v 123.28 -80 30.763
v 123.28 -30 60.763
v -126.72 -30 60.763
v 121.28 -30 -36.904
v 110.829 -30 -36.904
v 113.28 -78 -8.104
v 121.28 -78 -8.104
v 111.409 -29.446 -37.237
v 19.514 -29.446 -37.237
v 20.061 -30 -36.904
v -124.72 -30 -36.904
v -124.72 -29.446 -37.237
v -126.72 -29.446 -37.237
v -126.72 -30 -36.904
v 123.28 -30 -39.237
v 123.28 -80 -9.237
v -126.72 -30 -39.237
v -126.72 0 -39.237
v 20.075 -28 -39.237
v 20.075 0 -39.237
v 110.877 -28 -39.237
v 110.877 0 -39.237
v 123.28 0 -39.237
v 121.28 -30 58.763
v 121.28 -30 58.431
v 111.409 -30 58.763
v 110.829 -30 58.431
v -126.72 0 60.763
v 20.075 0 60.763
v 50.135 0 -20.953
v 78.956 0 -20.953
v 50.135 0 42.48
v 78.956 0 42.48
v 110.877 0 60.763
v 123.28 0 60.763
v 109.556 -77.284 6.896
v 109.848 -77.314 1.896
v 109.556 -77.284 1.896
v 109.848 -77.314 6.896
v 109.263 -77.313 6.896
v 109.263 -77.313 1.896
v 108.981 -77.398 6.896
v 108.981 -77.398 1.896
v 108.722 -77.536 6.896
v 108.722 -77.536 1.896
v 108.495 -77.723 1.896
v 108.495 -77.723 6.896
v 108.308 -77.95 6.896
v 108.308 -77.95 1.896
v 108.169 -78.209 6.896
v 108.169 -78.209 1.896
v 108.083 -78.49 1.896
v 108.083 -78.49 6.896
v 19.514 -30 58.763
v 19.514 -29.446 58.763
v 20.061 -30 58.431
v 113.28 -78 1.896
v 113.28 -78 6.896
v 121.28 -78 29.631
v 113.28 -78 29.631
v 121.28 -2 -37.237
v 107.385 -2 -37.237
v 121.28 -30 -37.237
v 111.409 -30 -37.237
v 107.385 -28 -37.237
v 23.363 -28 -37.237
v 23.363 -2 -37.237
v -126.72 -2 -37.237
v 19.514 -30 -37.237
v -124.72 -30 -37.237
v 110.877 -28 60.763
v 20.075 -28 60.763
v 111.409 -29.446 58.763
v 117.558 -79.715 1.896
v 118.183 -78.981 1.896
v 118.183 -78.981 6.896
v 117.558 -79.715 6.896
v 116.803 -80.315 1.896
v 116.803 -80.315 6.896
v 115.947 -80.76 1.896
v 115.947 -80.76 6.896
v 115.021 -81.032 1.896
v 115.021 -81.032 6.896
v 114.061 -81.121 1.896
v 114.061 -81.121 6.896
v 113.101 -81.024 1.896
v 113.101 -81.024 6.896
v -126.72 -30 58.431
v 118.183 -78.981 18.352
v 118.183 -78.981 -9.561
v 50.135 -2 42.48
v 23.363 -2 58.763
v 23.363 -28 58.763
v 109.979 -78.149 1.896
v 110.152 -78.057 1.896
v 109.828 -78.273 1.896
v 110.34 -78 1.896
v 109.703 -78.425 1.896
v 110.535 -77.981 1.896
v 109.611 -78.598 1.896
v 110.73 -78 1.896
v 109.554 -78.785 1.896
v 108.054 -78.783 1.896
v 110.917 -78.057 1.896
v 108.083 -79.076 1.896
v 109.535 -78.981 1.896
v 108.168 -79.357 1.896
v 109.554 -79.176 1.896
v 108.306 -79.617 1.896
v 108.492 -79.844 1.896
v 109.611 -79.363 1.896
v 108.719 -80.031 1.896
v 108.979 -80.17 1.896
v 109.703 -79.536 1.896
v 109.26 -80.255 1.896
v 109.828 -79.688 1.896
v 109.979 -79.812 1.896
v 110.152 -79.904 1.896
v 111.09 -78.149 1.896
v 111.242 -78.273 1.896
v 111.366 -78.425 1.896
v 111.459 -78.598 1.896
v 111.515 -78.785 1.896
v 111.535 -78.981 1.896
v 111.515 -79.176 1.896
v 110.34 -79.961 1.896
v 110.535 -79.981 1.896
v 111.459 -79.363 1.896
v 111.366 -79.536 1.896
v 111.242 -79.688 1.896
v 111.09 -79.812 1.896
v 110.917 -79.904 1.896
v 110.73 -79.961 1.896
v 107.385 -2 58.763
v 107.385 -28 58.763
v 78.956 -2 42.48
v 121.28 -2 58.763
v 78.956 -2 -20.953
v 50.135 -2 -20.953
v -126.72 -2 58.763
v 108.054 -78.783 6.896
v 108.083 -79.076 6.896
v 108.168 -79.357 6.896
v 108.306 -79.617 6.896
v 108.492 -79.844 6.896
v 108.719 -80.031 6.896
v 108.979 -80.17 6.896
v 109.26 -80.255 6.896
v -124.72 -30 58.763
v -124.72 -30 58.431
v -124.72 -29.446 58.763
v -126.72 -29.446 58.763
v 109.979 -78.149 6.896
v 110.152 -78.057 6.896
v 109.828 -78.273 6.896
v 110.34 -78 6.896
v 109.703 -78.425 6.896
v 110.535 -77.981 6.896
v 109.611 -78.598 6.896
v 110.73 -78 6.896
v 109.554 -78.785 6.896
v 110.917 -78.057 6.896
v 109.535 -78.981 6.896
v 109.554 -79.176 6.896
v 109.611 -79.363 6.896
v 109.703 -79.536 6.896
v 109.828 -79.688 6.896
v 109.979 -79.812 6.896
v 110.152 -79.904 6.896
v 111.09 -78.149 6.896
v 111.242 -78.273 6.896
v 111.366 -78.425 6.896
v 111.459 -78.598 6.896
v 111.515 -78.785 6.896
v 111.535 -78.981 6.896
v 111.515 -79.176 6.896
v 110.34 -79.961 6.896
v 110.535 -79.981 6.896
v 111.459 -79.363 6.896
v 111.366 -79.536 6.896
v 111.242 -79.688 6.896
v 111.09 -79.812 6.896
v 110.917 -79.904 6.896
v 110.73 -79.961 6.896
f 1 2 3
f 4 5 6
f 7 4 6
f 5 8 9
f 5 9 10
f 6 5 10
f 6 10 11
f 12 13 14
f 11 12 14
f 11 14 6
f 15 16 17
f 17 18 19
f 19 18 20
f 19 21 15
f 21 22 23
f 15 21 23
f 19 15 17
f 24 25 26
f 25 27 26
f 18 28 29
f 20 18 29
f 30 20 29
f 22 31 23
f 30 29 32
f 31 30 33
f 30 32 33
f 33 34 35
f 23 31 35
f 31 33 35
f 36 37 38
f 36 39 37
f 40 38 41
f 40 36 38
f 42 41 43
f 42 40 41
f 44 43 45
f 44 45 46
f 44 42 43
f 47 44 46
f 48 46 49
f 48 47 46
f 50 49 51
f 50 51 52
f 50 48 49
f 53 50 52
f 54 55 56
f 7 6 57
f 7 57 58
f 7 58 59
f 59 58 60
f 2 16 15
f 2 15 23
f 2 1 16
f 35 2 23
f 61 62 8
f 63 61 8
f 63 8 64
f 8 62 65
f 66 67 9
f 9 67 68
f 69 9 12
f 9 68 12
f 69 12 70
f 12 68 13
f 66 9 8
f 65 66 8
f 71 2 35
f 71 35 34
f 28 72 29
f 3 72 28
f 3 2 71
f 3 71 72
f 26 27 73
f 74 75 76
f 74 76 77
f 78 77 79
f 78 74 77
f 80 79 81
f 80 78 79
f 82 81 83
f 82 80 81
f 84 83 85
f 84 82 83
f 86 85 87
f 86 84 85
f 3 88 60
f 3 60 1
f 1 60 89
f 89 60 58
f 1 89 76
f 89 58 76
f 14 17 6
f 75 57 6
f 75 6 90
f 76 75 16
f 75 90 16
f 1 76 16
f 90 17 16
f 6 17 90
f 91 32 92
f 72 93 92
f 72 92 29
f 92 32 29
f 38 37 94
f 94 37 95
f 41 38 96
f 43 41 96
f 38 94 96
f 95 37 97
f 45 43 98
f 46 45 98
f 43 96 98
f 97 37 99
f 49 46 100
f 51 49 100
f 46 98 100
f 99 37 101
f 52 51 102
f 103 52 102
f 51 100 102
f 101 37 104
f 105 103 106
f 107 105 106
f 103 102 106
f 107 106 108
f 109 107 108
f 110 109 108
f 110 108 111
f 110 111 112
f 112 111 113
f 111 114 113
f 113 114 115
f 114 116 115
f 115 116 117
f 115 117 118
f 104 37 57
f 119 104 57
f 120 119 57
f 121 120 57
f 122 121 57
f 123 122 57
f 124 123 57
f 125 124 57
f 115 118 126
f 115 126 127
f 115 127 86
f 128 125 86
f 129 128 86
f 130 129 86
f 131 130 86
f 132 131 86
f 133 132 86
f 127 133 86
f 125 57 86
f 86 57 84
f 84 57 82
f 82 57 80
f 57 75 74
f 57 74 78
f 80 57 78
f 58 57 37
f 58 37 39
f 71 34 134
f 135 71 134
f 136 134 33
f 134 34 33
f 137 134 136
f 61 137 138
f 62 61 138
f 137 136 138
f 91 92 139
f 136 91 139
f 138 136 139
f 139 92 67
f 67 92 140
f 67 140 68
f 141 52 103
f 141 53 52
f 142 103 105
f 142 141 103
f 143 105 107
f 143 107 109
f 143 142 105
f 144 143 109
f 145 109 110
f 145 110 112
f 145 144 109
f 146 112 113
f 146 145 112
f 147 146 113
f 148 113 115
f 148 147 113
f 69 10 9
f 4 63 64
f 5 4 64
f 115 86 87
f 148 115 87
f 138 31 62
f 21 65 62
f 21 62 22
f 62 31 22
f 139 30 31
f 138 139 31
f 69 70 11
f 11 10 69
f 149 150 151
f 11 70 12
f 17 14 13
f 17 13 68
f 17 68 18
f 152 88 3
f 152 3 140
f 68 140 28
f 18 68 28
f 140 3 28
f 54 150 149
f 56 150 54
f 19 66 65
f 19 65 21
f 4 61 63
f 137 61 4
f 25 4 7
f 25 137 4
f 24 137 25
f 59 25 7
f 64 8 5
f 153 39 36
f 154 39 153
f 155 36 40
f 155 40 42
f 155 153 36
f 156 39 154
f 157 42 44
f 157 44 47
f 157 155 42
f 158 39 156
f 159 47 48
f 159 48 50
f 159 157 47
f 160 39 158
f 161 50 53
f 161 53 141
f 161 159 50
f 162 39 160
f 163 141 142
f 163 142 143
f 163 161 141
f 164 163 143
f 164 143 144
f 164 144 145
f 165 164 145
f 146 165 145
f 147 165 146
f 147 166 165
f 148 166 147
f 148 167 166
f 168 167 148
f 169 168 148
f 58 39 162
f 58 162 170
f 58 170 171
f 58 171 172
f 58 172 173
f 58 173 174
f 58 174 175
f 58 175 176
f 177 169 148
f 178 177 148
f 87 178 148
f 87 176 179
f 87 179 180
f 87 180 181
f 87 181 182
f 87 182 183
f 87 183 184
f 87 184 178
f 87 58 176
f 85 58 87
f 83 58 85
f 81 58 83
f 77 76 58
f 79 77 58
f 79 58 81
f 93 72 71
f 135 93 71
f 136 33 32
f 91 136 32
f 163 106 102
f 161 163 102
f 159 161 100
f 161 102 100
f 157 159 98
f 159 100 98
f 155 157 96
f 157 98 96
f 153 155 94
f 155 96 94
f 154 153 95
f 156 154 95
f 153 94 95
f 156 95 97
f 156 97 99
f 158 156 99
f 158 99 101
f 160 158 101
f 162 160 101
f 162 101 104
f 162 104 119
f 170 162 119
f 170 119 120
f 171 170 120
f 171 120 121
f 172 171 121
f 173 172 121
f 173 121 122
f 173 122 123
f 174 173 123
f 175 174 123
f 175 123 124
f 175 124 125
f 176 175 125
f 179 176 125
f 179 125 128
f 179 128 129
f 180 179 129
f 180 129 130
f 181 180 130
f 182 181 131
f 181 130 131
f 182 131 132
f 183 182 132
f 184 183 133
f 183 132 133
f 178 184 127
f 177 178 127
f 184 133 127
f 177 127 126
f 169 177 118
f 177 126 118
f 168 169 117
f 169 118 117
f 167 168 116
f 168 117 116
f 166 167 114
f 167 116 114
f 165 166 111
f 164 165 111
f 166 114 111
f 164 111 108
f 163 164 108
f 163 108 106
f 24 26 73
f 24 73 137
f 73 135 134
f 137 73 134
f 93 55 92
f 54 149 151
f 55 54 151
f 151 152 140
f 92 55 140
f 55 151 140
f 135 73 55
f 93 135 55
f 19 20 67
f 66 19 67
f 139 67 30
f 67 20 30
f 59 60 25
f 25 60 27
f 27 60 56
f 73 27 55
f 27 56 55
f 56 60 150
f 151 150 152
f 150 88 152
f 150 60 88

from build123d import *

# Parameters (mm, degrees)
F1_DEPTH     = 5
F3_DEPTH     = 25
F5_DEPTH     = 2
F7_DEPTH     = 250
F9_DEPTH     = 248
F11_DEPTH    = 110
F13_W        = 5
F13_H        = 5
F14_DEPTH    = 3
F15_T1_DEPTH = 27.9128784748
F16_DEPTH    = 5
F18_D        = 2
F19_R        = 1.49999


# Not quite as in the source:
# - a fillet or chamfer that OpenCascade refuses, or shapes differently, is made with other operations: its cross-section is extruded or revolved along the edge and cut away or added
# - a fillet or chamfer is up to 0.001 mm smaller than in the source, because OpenCascade refuses the exact size


with BuildPart() as f1:
    # F0 (on Front) → F1 (new body)
    with BuildSketch(Plane.XZ):
        Polygon((20.074704662, 60.7631485909), (-126.7197424916, 60.7631485909), (-126.7197424916, 10.7631485909), (-126.7197424916, -39.2368514091), (20.074704662, -39.2368514091), (50.1353926957, -20.9532961249), (78.9564624429, -20.9532961249), (110.8765751123, -39.2368514091), (123.2802575084, -39.2368514091), (123.2802575084, 10.7631485909), (123.2802575084, 60.7631485909), (110.8765751123, 60.7631485909), (78.9564624429, 42.4795933068), (50.1353926957, 42.4795933068), align=None)
    extrude(amount=F1_DEPTH)

    # F2 (on face) → F3 (join)
    with BuildSketch(Plane.XZ.offset(5)):
        Polygon((-126.7197424916, -39.2368514091), (20.074704662, -39.2368514091), (50.1353926957, -20.9532961249), (78.9564624429, -20.9532961249), (110.8765751123, -39.2368514091), (123.2802575084, -39.2368514091), (123.2802575084, 60.7631485909), (110.8765751123, 60.7631485909), (78.9564624429, 42.4795933068), (50.1353926957, 42.4795933068), (20.074704662, 60.7631485909), (-126.7197424916, 60.7631485909), align=None)
        Polygon((49.574933962, -18.9532961249), (19.5142459283, -37.2368514091), (-124.7197424916, -37.2368514091), (-124.7197424916, 58.7631485909), (19.5142459283, 58.7631485909), (49.574933962, 40.4795933068), (79.4886903674, 40.4795933068), (111.4088030368, 58.7631485909), (121.2802575084, 58.7631485909), (121.2802575084, -37.2368514091), (111.4088030368, -37.2368514091), (79.4886903674, -18.9532961249), align=None, mode=Mode.SUBTRACT)
    extrude(amount=F3_DEPTH)

    # F4 (on face) → F5 (join)
    with BuildSketch(Plane.XZ.offset(30)):
        Polygon((110.8765751123, 60.7631485909), (20.074704662, 60.7631485909), (50.1353926957, 42.4795933068), (78.9564624429, 42.4795933068), align=None)
        Polygon((50.1353926957, -20.9532961249), (20.074704662, -39.2368514091), (110.8765751123, -39.2368514091), (78.9564624429, -20.9532961249), align=None)
    extrude(amount=-F5_DEPTH)

    # F6 (on face) → F7 (join)
    with BuildSketch(Plane.YZ.offset(123.2802575084)):
        Polygon((-80, -9.2368514091), (-30, -39.2368514091), (-30, 60.7631485909), (-80, 30.7631485909), align=None)
    extrude(amount=-F7_DEPTH)

    # F8 (on face) → F9 (cut)
    with BuildSketch(Plane(origin=(-126.7197424916, 0, 0), x_dir=(0, -1, 0), z_dir=(-1, 0, 0))):
        Polygon((78, 29.630767833), (29.4460320701, 58.7631485909), (2, 58.7631485909), (2, -37.2368514091), (29.4460320701, -37.2368514091), (78, -8.1044706511), align=None)
    extrude(amount=-F9_DEPTH, mode=Mode.SUBTRACT)

    # F10 (on face) → F11 (cut)
    with BuildSketch(Plane(origin=(0, 0, -39.2368514091), x_dir=(1, 0, 0), z_dir=(0, 0, -1))):
        Polygon((-126.7197424916, 80), (-126.7197424916, 30), (123.2802575084, 80), align=None)
    extrude(amount=-F11_DEPTH, mode=Mode.SUBTRACT)

    # F13 (on face) → F14 (join)
    with BuildSketch(Plane(origin=(-10.6430670189, -53.2153350945, 0), x_dir=(0.9805806757, -0.1961161351, 0), z_dir=(-0.1961161351, -0.9805806757, 0))):
        with Locations((128.8774899908, 4.3955293489)):
            Rectangle(F13_W, F13_H)
    extrude(amount=F14_DEPTH)

    # F15: fillet of radius 5 on 1 edges, made by hand

    # F15_s2 → F15_t1 (cut)
    with BuildSketch(Plane.XY.offset(-9.5609098885)):
        with BuildLine():
            ThreePointArc((118.1831608869, -78.9805806757), (115.9468261093, -80.7598517163), (113.1012273101, -81.0236056685))
            Line((113.1012273101, -81.0236056685), (117.5948124814, -81.9223227028))
            Line((117.5948124814, -81.9223227028), (118.1831608869, -78.9805806757))
        make_face()
    extrude(amount=F15_T1_DEPTH, mode=Mode.SUBTRACT)

    # F16 (add): a face of the model
    f16_faces = [f1.faces().sort_by_distance(p)[0] for p in [
        (112.9860833057, -79.4708710135, 4.3955293489),
    ]]
    extrude(f16_faces, amount=F16_DEPTH)

    # F18 (through all)
    with Locations(Plane.XY.offset(6.8955293489)):
        with Locations((110.5346316165, -78.9805806757)):
            Hole(F18_D / 2)

    # F19 (radius 1.5 in the source; OpenCascade refuses exactly that, so slightly less here)
    f19_edges = [f1.edges().sort_by_distance(p)[0] for p in [
        (108.377354, -77.019419, 4.395529),
        (107.789006, -79.961161, 4.395529),
    ]]
    fillet(f19_edges, radius=F19_R)


solid = f1.part
